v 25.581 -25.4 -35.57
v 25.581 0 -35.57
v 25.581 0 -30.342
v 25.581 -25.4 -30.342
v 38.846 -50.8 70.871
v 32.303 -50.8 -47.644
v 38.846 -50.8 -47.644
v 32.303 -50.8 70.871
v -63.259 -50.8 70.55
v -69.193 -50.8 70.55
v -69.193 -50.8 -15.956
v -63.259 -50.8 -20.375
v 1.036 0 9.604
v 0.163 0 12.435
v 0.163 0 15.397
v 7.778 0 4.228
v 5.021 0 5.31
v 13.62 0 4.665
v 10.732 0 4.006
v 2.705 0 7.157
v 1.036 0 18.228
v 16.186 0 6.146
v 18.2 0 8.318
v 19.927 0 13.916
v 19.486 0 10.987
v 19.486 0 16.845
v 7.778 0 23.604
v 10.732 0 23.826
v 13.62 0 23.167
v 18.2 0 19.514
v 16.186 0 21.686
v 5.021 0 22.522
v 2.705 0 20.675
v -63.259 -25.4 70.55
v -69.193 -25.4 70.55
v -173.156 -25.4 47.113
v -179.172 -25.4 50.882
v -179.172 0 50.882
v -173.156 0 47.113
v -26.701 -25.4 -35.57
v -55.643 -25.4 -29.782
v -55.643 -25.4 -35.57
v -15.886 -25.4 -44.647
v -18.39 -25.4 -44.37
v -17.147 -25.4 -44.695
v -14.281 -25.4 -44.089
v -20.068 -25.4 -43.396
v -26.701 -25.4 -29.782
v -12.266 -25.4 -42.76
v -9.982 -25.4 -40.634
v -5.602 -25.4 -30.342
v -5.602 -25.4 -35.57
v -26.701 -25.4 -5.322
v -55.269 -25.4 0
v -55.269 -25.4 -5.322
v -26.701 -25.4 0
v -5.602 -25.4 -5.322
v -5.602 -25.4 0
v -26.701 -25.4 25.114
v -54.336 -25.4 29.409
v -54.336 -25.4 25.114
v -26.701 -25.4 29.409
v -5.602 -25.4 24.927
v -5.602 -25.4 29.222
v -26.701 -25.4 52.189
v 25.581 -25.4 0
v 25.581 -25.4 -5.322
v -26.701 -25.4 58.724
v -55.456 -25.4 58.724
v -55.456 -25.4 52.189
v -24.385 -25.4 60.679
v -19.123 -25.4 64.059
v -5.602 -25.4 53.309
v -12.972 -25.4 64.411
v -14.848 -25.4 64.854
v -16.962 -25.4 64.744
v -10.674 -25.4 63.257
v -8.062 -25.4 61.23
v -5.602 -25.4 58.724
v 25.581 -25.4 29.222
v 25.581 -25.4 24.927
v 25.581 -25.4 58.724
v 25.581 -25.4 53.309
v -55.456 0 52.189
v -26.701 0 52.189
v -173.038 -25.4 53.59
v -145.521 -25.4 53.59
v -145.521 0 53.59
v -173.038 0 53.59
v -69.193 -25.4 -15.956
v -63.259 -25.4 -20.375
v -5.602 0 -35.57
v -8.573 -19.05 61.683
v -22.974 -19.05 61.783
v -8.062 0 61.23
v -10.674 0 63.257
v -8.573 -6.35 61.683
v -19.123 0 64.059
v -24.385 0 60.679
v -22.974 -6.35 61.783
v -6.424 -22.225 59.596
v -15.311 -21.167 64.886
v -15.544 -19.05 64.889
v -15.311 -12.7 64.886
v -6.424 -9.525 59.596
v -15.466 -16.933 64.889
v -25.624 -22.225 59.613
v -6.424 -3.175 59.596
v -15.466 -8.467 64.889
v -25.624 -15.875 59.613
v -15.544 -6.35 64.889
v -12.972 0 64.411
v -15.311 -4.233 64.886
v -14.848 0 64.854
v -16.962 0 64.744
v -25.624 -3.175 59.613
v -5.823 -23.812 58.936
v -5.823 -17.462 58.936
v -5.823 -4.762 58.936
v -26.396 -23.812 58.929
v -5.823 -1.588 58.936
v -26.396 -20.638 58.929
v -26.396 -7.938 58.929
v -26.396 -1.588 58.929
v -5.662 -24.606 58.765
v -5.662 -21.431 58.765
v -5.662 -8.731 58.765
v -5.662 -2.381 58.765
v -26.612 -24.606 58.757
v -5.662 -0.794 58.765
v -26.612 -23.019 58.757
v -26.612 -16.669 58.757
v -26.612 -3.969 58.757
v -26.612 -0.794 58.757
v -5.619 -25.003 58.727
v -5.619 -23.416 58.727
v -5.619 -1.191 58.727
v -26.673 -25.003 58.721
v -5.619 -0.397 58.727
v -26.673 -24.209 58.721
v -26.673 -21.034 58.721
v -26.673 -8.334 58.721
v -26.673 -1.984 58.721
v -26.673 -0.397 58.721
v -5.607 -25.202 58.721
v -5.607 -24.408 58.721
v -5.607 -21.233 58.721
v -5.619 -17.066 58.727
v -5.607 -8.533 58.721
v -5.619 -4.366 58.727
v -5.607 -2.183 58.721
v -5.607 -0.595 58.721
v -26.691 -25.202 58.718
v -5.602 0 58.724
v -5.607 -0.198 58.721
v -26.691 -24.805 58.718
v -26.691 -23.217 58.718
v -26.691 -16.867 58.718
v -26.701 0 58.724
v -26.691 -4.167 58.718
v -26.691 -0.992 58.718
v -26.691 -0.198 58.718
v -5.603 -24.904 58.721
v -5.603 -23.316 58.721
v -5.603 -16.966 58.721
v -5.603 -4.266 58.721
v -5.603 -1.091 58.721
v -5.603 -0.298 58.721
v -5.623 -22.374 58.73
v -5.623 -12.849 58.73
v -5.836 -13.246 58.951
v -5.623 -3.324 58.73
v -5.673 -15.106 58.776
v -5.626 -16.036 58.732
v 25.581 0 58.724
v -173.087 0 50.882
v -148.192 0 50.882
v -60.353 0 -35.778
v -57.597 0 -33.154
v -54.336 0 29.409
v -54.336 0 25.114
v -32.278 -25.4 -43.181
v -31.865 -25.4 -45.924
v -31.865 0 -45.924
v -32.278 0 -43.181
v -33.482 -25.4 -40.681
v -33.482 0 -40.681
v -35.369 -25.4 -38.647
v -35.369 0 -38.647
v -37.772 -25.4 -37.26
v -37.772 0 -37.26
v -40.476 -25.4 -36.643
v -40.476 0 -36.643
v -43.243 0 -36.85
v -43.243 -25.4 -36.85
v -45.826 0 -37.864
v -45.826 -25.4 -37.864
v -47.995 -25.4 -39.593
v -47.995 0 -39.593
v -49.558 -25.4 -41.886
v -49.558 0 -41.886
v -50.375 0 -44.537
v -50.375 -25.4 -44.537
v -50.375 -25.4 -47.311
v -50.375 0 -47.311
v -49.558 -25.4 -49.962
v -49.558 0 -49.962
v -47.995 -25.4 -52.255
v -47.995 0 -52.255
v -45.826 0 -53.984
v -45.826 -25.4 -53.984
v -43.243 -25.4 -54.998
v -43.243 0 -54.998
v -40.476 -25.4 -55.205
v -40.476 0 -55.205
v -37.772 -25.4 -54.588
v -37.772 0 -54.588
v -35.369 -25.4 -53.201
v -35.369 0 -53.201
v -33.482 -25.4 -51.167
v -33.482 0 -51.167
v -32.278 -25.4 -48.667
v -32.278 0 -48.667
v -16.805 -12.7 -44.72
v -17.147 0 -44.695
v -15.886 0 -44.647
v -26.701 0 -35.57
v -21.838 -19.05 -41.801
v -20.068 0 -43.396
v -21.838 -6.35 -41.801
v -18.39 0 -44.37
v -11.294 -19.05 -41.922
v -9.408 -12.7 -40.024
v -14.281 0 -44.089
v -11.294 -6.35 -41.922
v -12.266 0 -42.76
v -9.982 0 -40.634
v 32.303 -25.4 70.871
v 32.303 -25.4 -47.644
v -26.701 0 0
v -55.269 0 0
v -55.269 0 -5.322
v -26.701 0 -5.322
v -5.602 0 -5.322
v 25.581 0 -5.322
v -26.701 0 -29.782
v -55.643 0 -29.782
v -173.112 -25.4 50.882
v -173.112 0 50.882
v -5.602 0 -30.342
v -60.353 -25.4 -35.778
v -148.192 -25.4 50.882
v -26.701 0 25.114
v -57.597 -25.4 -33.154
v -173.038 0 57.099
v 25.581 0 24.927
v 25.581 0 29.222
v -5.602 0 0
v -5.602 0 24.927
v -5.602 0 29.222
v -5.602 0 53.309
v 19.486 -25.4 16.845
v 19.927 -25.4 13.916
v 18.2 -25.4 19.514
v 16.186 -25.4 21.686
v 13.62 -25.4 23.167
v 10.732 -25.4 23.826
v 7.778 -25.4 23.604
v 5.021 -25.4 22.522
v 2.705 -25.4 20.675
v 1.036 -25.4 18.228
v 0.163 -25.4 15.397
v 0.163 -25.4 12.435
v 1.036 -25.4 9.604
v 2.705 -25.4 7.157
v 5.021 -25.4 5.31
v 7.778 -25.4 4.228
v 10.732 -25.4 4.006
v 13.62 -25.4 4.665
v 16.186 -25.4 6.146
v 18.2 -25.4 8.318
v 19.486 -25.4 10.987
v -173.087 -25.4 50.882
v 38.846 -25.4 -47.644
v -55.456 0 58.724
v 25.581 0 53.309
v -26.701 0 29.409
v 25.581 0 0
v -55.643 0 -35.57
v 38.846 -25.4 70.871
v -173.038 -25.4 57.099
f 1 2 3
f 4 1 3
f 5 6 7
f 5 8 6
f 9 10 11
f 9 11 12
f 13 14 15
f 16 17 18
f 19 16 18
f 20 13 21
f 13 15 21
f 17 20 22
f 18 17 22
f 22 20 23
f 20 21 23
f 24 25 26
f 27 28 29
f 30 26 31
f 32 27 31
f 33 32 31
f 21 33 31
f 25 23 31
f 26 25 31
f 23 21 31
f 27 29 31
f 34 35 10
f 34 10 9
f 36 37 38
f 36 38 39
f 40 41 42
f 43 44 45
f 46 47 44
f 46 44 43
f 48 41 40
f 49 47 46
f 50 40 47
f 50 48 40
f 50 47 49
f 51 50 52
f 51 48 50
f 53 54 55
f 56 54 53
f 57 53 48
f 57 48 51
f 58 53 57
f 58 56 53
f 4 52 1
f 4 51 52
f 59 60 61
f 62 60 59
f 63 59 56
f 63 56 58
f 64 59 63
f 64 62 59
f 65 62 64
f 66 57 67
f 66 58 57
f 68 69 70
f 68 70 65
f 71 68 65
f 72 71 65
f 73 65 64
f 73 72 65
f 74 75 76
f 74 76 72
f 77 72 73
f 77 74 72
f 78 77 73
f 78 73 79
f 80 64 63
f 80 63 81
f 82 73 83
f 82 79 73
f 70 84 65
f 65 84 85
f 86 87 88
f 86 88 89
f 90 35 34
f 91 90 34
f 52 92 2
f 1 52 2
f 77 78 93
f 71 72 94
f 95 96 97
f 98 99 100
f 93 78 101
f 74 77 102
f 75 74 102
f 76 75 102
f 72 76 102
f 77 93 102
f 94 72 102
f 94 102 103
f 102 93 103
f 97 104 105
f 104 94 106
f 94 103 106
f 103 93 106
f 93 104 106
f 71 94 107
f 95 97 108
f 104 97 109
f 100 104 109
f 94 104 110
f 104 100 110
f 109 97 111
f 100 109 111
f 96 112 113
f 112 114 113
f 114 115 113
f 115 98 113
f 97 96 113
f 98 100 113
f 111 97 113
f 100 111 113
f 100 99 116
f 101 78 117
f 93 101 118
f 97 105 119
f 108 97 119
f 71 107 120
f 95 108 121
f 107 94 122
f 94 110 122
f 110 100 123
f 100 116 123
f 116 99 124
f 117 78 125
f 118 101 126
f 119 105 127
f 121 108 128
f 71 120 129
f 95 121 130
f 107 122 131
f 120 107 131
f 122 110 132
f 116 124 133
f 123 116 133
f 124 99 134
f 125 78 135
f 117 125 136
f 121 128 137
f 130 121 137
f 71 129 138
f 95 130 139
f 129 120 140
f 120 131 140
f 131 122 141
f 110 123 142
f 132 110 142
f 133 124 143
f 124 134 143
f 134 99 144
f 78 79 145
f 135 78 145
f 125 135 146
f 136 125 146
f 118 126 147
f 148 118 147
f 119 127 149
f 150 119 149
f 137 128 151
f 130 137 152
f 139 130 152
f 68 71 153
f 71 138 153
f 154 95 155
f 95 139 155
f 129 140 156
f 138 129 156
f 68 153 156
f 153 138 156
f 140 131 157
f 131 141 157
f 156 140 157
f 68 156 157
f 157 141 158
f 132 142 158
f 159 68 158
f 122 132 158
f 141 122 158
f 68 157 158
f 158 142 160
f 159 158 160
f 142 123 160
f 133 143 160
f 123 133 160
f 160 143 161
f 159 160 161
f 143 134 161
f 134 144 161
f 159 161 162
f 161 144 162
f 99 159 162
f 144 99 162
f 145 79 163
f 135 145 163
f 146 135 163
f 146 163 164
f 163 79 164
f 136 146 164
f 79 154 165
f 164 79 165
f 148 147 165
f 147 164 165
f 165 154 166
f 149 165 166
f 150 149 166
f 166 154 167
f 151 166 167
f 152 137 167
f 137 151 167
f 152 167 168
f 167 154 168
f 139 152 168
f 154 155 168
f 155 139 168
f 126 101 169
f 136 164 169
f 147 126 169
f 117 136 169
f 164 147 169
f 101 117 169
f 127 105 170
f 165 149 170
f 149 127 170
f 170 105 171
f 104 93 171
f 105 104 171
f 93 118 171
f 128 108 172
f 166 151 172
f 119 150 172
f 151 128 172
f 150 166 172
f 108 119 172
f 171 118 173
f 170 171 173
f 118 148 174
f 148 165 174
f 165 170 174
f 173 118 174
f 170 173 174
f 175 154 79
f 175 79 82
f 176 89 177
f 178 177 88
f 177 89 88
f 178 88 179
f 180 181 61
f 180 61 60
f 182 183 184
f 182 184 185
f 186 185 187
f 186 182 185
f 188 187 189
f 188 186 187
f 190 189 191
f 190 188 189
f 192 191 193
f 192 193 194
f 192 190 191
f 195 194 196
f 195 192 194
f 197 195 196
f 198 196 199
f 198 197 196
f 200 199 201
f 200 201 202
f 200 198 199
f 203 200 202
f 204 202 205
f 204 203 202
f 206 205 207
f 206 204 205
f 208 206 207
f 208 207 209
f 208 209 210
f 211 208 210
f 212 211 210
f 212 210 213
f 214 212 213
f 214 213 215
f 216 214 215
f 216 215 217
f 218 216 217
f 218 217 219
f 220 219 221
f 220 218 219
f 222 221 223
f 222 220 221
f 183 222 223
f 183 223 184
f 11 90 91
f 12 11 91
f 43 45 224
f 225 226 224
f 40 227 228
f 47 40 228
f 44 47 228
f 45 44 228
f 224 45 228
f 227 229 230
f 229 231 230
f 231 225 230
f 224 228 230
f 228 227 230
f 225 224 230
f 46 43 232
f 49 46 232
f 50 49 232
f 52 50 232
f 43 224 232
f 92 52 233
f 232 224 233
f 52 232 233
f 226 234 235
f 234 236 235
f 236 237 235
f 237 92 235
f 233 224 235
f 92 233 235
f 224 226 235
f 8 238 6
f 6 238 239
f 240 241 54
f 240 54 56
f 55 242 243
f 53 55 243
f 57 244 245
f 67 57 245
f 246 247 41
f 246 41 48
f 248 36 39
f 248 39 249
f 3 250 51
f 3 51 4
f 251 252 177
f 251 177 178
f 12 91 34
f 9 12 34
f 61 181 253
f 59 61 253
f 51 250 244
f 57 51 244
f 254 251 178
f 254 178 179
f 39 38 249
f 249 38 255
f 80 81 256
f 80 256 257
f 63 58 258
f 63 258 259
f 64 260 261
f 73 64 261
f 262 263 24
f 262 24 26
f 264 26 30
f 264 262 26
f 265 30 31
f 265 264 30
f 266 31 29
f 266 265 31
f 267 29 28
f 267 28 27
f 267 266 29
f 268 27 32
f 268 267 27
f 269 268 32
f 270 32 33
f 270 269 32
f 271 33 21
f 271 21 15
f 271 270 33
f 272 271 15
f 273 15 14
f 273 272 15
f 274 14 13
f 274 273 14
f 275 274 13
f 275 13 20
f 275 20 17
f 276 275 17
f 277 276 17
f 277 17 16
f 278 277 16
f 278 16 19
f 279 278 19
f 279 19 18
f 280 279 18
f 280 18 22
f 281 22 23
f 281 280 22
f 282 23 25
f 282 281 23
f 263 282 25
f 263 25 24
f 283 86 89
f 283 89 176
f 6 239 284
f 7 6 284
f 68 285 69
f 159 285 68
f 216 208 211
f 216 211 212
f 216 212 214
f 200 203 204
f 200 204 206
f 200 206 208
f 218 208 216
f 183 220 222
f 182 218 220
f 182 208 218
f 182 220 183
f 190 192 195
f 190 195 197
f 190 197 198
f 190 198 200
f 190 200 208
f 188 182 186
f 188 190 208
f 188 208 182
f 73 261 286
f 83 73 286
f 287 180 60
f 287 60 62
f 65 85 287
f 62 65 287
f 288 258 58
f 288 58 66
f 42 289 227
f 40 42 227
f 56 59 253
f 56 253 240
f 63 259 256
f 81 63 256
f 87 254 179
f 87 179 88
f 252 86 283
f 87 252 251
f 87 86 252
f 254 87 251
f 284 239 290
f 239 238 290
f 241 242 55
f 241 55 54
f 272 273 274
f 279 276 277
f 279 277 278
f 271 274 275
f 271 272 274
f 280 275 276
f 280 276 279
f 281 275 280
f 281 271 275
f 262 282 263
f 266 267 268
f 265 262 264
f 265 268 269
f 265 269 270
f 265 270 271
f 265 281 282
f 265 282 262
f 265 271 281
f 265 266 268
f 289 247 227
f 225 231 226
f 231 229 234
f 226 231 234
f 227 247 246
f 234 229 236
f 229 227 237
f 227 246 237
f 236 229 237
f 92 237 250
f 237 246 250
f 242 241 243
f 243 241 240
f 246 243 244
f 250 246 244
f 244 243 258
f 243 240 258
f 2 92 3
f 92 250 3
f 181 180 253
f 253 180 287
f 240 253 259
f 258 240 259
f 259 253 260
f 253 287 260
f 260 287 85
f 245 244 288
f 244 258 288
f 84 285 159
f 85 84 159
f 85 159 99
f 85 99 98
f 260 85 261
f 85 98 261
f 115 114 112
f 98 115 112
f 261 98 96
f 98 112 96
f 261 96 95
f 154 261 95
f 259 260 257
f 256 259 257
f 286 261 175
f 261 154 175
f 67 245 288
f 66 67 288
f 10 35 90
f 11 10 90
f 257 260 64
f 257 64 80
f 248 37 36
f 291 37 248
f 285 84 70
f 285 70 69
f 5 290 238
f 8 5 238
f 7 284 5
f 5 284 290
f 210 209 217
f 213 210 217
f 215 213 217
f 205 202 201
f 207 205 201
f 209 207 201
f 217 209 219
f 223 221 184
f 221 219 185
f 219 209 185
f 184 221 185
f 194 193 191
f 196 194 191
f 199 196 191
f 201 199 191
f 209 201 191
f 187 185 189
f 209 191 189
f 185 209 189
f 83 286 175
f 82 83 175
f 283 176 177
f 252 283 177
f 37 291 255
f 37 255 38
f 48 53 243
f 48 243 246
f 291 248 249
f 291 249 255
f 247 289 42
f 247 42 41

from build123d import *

# Parameters (mm, degrees)
F0_W     = 31.1824278906
F0_H     = 5.4149143398
F0_W_2   = 28.7550520152
F0_H_2   = 6.535243243
F0_W_3   = 27.6347268373
F0_H_3   = 4.2945835739
F0_H_4   = 4.2945872992
F0_H_5   = 5.3215520456
F0_W_4   = 28.5683330148
F0_W_5   = 28.9417747408
F0_H_6   = 5.7883523405
F0_H_7   = 5.2281897515
F1_DEPTH = 25.4
F2_R     = 9.9376162311
F3_DEPTH = 25.4
F2_R_2   = 9.3072509838
F5_DEPTH = 25.4
F4_W     = 5.9344172478
F4_H     = 7.4104368687


# Not quite as in the source:
# - the program builds the solid bodies; features that only make, move or delete a surface that nothing else refers to are left out


with BuildPart() as f1:
    # F0 (on Front) → F1 (new body)
    with BuildSketch(Plane.XZ):
        with Locations((9.9895796739, 56.0163389891)):
            Rectangle(F0_W, F0_H)
        with BuildLine():
            Line((-5.6016342714, 24.9272696674), (-5.6016342714, 29.2218569666))
            Line((-5.6016342714, 29.2218569666), (-5.6016342714, 53.3088818192))
            Line((-5.6016342714, 53.3088818192), (-5.6016342714, 58.723796159))
            add(Edge.make_bspline(
                [(-5.6016342714, 58.723796159), (-5.6426806139, 58.5647439553), (-15.1337303989, 71.2523431637), (-26.5753917973, 58.490990697), (-26.7011206597, 58.723796159)],
                knots=[0, 0, 0, 0, 0.2396480462, 0.4939586428, 0.4939586428, 0.4939586428, 0.4939586428], degree=3))
            Line((-26.7011206597, 58.723796159), (-26.7011206597, 52.188552916))
            Line((-26.7011206597, 52.188552916), (-26.7011206597, 29.408575967))
            Line((-26.7011206597, 29.408575967), (-26.7011206597, 25.113992393))
            Line((-26.7011206597, 25.113992393), (-26.7011206597, 0))
            Line((-26.7011206597, 0), (-26.7011206597, -5.3215520456))
            Line((-26.7011206597, -5.3215520456), (-26.7011206597, -16.7115405202))
            Line((-26.7011206597, -16.7115405202), (-26.7011206597, -29.7820195556))
            Line((-26.7011206597, -29.7820195556), (-26.7011206597, -35.570371896))
            add(Edge.make_bspline(
                [(-26.7011206597, -35.570371896), (-23.4775358451, -40.0920960999), (-16.914419193, -49.2981834607), (-9.4167152022, -40.1998873057), (-5.6016342714, -35.570371896)],
                knots=[0, 0, 0, 0, 0.4911667711, 1, 1, 1, 1], degree=3))
            Line((-5.6016342714, -35.570371896), (-5.6016342714, -30.3421821445))
            Line((-5.6016342714, -30.3421821445), (-5.6016342714, -5.3215520456))
            Line((-5.6016342714, -5.3215520456), (-5.6016342714, 0))
            Line((-5.6016342714, 0), (-5.6016342714, 24.9272696674))
        make_face()
        with Locations((-41.0786466673, 55.4561745375)):
            Rectangle(F0_W_2, F0_H_2)
        with Locations((-40.5184840783, 27.26128418)):
            Rectangle(F0_W_3, F0_H_3)
        with Locations((9.9895796739, 27.074563317)):
            Rectangle(F0_W, F0_H_4)
        with Locations((9.9895796739, -2.6607760228)):
            Rectangle(F0_W, F0_H_5)
        with Locations((-40.9852871671, -2.6607760228)):
            Rectangle(F0_W_4, F0_H_5)
        with Locations((-41.1720080301, -32.6761957258)):
            Rectangle(F0_W_5, F0_H_6)
        with Locations((9.9895796739, -32.9562770203)):
            Rectangle(F0_W, F0_H_7)
    extrude(amount=F1_DEPTH)


with BuildPart() as f3:
    # F2 (on face) → F3 (new body)
    with BuildSketch(Plane.XZ.offset(25.4)):
        with Locations((9.9895796739, 13.9160072431)):
            Circle(F2_R)
    extrude(amount=-F3_DEPTH)


with BuildPart() as f3b:
    # F2 (on face) → F3, piece 2 (new body)
    with BuildSketch(Plane.XZ.offset(25.4)):
        with Locations((-41.1720080301, -45.9239631891)):
            Circle(F2_R_2)
    extrude(amount=-F3_DEPTH)


with BuildPart() as f3c:
    # F2 (on face) → F3, piece 3 (new body)
    with BuildSketch(Plane.XZ.offset(25.4)):
        Polygon((-60.3531059439, -35.778459874), (-57.597335428, -33.1539027393), (-145.5208361149, 53.5896010697), (-148.1922638691, 50.881833114), align=None)
        Polygon((-148.1922638691, 50.881833114), (-145.5208361149, 53.5896010697), (-173.0377972126, 53.5896010697), (-173.0874284987, 50.881833114), align=None)
    extrude(amount=-F3_DEPTH)


with BuildPart() as f3d:
    # F2 (on face) → F3, piece 4 (new body)
    with BuildSketch(Plane.XZ.offset(25.4)):
        Polygon((-173.1564998627, 47.1134595573), (-173.111705617, 50.881833114), (-173.0377972126, 57.0994727314), (-179.1719916159, 50.881833114), align=None)
    extrude(amount=-F3_DEPTH)


with BuildPart() as f5:
    # F4 (on face) → F5 (new body)
    with BuildSketch(Plane.XZ.offset(25.4)):
        Polygon((38.8462878764, 62.9734322429), (32.3033370078, 63.1396621466), (32.3033370078, -47.6440042257), (38.8462878764, -47.6440042257), align=None)
        Polygon((32.3033370078, 70.8710029721), (32.3033370078, 63.1396621466), (38.8462878764, 62.9734322429), (38.8462878764, 70.8710029721), align=None)
    extrude(amount=F5_DEPTH)


with BuildPart() as f5b:
    # F4 (on face) → F5, piece 2 (new body)
    with BuildSketch(Plane.XZ.offset(25.4)):
        with Locations((-66.2259534001, 66.8448805809)):
            Rectangle(F4_W, F4_H)
        Polygon((-63.2587447762, -20.3745421022), (-63.2587447762, 63.1396621466), (-69.193162024, 63.1396621466), (-69.193162024, -15.9559678286), align=None)
    extrude(amount=F5_DEPTH)


solid = Compound([f1.part, f3.part, f3b.part, f3c.part, f3d.part, f5.part, f5b.part])
